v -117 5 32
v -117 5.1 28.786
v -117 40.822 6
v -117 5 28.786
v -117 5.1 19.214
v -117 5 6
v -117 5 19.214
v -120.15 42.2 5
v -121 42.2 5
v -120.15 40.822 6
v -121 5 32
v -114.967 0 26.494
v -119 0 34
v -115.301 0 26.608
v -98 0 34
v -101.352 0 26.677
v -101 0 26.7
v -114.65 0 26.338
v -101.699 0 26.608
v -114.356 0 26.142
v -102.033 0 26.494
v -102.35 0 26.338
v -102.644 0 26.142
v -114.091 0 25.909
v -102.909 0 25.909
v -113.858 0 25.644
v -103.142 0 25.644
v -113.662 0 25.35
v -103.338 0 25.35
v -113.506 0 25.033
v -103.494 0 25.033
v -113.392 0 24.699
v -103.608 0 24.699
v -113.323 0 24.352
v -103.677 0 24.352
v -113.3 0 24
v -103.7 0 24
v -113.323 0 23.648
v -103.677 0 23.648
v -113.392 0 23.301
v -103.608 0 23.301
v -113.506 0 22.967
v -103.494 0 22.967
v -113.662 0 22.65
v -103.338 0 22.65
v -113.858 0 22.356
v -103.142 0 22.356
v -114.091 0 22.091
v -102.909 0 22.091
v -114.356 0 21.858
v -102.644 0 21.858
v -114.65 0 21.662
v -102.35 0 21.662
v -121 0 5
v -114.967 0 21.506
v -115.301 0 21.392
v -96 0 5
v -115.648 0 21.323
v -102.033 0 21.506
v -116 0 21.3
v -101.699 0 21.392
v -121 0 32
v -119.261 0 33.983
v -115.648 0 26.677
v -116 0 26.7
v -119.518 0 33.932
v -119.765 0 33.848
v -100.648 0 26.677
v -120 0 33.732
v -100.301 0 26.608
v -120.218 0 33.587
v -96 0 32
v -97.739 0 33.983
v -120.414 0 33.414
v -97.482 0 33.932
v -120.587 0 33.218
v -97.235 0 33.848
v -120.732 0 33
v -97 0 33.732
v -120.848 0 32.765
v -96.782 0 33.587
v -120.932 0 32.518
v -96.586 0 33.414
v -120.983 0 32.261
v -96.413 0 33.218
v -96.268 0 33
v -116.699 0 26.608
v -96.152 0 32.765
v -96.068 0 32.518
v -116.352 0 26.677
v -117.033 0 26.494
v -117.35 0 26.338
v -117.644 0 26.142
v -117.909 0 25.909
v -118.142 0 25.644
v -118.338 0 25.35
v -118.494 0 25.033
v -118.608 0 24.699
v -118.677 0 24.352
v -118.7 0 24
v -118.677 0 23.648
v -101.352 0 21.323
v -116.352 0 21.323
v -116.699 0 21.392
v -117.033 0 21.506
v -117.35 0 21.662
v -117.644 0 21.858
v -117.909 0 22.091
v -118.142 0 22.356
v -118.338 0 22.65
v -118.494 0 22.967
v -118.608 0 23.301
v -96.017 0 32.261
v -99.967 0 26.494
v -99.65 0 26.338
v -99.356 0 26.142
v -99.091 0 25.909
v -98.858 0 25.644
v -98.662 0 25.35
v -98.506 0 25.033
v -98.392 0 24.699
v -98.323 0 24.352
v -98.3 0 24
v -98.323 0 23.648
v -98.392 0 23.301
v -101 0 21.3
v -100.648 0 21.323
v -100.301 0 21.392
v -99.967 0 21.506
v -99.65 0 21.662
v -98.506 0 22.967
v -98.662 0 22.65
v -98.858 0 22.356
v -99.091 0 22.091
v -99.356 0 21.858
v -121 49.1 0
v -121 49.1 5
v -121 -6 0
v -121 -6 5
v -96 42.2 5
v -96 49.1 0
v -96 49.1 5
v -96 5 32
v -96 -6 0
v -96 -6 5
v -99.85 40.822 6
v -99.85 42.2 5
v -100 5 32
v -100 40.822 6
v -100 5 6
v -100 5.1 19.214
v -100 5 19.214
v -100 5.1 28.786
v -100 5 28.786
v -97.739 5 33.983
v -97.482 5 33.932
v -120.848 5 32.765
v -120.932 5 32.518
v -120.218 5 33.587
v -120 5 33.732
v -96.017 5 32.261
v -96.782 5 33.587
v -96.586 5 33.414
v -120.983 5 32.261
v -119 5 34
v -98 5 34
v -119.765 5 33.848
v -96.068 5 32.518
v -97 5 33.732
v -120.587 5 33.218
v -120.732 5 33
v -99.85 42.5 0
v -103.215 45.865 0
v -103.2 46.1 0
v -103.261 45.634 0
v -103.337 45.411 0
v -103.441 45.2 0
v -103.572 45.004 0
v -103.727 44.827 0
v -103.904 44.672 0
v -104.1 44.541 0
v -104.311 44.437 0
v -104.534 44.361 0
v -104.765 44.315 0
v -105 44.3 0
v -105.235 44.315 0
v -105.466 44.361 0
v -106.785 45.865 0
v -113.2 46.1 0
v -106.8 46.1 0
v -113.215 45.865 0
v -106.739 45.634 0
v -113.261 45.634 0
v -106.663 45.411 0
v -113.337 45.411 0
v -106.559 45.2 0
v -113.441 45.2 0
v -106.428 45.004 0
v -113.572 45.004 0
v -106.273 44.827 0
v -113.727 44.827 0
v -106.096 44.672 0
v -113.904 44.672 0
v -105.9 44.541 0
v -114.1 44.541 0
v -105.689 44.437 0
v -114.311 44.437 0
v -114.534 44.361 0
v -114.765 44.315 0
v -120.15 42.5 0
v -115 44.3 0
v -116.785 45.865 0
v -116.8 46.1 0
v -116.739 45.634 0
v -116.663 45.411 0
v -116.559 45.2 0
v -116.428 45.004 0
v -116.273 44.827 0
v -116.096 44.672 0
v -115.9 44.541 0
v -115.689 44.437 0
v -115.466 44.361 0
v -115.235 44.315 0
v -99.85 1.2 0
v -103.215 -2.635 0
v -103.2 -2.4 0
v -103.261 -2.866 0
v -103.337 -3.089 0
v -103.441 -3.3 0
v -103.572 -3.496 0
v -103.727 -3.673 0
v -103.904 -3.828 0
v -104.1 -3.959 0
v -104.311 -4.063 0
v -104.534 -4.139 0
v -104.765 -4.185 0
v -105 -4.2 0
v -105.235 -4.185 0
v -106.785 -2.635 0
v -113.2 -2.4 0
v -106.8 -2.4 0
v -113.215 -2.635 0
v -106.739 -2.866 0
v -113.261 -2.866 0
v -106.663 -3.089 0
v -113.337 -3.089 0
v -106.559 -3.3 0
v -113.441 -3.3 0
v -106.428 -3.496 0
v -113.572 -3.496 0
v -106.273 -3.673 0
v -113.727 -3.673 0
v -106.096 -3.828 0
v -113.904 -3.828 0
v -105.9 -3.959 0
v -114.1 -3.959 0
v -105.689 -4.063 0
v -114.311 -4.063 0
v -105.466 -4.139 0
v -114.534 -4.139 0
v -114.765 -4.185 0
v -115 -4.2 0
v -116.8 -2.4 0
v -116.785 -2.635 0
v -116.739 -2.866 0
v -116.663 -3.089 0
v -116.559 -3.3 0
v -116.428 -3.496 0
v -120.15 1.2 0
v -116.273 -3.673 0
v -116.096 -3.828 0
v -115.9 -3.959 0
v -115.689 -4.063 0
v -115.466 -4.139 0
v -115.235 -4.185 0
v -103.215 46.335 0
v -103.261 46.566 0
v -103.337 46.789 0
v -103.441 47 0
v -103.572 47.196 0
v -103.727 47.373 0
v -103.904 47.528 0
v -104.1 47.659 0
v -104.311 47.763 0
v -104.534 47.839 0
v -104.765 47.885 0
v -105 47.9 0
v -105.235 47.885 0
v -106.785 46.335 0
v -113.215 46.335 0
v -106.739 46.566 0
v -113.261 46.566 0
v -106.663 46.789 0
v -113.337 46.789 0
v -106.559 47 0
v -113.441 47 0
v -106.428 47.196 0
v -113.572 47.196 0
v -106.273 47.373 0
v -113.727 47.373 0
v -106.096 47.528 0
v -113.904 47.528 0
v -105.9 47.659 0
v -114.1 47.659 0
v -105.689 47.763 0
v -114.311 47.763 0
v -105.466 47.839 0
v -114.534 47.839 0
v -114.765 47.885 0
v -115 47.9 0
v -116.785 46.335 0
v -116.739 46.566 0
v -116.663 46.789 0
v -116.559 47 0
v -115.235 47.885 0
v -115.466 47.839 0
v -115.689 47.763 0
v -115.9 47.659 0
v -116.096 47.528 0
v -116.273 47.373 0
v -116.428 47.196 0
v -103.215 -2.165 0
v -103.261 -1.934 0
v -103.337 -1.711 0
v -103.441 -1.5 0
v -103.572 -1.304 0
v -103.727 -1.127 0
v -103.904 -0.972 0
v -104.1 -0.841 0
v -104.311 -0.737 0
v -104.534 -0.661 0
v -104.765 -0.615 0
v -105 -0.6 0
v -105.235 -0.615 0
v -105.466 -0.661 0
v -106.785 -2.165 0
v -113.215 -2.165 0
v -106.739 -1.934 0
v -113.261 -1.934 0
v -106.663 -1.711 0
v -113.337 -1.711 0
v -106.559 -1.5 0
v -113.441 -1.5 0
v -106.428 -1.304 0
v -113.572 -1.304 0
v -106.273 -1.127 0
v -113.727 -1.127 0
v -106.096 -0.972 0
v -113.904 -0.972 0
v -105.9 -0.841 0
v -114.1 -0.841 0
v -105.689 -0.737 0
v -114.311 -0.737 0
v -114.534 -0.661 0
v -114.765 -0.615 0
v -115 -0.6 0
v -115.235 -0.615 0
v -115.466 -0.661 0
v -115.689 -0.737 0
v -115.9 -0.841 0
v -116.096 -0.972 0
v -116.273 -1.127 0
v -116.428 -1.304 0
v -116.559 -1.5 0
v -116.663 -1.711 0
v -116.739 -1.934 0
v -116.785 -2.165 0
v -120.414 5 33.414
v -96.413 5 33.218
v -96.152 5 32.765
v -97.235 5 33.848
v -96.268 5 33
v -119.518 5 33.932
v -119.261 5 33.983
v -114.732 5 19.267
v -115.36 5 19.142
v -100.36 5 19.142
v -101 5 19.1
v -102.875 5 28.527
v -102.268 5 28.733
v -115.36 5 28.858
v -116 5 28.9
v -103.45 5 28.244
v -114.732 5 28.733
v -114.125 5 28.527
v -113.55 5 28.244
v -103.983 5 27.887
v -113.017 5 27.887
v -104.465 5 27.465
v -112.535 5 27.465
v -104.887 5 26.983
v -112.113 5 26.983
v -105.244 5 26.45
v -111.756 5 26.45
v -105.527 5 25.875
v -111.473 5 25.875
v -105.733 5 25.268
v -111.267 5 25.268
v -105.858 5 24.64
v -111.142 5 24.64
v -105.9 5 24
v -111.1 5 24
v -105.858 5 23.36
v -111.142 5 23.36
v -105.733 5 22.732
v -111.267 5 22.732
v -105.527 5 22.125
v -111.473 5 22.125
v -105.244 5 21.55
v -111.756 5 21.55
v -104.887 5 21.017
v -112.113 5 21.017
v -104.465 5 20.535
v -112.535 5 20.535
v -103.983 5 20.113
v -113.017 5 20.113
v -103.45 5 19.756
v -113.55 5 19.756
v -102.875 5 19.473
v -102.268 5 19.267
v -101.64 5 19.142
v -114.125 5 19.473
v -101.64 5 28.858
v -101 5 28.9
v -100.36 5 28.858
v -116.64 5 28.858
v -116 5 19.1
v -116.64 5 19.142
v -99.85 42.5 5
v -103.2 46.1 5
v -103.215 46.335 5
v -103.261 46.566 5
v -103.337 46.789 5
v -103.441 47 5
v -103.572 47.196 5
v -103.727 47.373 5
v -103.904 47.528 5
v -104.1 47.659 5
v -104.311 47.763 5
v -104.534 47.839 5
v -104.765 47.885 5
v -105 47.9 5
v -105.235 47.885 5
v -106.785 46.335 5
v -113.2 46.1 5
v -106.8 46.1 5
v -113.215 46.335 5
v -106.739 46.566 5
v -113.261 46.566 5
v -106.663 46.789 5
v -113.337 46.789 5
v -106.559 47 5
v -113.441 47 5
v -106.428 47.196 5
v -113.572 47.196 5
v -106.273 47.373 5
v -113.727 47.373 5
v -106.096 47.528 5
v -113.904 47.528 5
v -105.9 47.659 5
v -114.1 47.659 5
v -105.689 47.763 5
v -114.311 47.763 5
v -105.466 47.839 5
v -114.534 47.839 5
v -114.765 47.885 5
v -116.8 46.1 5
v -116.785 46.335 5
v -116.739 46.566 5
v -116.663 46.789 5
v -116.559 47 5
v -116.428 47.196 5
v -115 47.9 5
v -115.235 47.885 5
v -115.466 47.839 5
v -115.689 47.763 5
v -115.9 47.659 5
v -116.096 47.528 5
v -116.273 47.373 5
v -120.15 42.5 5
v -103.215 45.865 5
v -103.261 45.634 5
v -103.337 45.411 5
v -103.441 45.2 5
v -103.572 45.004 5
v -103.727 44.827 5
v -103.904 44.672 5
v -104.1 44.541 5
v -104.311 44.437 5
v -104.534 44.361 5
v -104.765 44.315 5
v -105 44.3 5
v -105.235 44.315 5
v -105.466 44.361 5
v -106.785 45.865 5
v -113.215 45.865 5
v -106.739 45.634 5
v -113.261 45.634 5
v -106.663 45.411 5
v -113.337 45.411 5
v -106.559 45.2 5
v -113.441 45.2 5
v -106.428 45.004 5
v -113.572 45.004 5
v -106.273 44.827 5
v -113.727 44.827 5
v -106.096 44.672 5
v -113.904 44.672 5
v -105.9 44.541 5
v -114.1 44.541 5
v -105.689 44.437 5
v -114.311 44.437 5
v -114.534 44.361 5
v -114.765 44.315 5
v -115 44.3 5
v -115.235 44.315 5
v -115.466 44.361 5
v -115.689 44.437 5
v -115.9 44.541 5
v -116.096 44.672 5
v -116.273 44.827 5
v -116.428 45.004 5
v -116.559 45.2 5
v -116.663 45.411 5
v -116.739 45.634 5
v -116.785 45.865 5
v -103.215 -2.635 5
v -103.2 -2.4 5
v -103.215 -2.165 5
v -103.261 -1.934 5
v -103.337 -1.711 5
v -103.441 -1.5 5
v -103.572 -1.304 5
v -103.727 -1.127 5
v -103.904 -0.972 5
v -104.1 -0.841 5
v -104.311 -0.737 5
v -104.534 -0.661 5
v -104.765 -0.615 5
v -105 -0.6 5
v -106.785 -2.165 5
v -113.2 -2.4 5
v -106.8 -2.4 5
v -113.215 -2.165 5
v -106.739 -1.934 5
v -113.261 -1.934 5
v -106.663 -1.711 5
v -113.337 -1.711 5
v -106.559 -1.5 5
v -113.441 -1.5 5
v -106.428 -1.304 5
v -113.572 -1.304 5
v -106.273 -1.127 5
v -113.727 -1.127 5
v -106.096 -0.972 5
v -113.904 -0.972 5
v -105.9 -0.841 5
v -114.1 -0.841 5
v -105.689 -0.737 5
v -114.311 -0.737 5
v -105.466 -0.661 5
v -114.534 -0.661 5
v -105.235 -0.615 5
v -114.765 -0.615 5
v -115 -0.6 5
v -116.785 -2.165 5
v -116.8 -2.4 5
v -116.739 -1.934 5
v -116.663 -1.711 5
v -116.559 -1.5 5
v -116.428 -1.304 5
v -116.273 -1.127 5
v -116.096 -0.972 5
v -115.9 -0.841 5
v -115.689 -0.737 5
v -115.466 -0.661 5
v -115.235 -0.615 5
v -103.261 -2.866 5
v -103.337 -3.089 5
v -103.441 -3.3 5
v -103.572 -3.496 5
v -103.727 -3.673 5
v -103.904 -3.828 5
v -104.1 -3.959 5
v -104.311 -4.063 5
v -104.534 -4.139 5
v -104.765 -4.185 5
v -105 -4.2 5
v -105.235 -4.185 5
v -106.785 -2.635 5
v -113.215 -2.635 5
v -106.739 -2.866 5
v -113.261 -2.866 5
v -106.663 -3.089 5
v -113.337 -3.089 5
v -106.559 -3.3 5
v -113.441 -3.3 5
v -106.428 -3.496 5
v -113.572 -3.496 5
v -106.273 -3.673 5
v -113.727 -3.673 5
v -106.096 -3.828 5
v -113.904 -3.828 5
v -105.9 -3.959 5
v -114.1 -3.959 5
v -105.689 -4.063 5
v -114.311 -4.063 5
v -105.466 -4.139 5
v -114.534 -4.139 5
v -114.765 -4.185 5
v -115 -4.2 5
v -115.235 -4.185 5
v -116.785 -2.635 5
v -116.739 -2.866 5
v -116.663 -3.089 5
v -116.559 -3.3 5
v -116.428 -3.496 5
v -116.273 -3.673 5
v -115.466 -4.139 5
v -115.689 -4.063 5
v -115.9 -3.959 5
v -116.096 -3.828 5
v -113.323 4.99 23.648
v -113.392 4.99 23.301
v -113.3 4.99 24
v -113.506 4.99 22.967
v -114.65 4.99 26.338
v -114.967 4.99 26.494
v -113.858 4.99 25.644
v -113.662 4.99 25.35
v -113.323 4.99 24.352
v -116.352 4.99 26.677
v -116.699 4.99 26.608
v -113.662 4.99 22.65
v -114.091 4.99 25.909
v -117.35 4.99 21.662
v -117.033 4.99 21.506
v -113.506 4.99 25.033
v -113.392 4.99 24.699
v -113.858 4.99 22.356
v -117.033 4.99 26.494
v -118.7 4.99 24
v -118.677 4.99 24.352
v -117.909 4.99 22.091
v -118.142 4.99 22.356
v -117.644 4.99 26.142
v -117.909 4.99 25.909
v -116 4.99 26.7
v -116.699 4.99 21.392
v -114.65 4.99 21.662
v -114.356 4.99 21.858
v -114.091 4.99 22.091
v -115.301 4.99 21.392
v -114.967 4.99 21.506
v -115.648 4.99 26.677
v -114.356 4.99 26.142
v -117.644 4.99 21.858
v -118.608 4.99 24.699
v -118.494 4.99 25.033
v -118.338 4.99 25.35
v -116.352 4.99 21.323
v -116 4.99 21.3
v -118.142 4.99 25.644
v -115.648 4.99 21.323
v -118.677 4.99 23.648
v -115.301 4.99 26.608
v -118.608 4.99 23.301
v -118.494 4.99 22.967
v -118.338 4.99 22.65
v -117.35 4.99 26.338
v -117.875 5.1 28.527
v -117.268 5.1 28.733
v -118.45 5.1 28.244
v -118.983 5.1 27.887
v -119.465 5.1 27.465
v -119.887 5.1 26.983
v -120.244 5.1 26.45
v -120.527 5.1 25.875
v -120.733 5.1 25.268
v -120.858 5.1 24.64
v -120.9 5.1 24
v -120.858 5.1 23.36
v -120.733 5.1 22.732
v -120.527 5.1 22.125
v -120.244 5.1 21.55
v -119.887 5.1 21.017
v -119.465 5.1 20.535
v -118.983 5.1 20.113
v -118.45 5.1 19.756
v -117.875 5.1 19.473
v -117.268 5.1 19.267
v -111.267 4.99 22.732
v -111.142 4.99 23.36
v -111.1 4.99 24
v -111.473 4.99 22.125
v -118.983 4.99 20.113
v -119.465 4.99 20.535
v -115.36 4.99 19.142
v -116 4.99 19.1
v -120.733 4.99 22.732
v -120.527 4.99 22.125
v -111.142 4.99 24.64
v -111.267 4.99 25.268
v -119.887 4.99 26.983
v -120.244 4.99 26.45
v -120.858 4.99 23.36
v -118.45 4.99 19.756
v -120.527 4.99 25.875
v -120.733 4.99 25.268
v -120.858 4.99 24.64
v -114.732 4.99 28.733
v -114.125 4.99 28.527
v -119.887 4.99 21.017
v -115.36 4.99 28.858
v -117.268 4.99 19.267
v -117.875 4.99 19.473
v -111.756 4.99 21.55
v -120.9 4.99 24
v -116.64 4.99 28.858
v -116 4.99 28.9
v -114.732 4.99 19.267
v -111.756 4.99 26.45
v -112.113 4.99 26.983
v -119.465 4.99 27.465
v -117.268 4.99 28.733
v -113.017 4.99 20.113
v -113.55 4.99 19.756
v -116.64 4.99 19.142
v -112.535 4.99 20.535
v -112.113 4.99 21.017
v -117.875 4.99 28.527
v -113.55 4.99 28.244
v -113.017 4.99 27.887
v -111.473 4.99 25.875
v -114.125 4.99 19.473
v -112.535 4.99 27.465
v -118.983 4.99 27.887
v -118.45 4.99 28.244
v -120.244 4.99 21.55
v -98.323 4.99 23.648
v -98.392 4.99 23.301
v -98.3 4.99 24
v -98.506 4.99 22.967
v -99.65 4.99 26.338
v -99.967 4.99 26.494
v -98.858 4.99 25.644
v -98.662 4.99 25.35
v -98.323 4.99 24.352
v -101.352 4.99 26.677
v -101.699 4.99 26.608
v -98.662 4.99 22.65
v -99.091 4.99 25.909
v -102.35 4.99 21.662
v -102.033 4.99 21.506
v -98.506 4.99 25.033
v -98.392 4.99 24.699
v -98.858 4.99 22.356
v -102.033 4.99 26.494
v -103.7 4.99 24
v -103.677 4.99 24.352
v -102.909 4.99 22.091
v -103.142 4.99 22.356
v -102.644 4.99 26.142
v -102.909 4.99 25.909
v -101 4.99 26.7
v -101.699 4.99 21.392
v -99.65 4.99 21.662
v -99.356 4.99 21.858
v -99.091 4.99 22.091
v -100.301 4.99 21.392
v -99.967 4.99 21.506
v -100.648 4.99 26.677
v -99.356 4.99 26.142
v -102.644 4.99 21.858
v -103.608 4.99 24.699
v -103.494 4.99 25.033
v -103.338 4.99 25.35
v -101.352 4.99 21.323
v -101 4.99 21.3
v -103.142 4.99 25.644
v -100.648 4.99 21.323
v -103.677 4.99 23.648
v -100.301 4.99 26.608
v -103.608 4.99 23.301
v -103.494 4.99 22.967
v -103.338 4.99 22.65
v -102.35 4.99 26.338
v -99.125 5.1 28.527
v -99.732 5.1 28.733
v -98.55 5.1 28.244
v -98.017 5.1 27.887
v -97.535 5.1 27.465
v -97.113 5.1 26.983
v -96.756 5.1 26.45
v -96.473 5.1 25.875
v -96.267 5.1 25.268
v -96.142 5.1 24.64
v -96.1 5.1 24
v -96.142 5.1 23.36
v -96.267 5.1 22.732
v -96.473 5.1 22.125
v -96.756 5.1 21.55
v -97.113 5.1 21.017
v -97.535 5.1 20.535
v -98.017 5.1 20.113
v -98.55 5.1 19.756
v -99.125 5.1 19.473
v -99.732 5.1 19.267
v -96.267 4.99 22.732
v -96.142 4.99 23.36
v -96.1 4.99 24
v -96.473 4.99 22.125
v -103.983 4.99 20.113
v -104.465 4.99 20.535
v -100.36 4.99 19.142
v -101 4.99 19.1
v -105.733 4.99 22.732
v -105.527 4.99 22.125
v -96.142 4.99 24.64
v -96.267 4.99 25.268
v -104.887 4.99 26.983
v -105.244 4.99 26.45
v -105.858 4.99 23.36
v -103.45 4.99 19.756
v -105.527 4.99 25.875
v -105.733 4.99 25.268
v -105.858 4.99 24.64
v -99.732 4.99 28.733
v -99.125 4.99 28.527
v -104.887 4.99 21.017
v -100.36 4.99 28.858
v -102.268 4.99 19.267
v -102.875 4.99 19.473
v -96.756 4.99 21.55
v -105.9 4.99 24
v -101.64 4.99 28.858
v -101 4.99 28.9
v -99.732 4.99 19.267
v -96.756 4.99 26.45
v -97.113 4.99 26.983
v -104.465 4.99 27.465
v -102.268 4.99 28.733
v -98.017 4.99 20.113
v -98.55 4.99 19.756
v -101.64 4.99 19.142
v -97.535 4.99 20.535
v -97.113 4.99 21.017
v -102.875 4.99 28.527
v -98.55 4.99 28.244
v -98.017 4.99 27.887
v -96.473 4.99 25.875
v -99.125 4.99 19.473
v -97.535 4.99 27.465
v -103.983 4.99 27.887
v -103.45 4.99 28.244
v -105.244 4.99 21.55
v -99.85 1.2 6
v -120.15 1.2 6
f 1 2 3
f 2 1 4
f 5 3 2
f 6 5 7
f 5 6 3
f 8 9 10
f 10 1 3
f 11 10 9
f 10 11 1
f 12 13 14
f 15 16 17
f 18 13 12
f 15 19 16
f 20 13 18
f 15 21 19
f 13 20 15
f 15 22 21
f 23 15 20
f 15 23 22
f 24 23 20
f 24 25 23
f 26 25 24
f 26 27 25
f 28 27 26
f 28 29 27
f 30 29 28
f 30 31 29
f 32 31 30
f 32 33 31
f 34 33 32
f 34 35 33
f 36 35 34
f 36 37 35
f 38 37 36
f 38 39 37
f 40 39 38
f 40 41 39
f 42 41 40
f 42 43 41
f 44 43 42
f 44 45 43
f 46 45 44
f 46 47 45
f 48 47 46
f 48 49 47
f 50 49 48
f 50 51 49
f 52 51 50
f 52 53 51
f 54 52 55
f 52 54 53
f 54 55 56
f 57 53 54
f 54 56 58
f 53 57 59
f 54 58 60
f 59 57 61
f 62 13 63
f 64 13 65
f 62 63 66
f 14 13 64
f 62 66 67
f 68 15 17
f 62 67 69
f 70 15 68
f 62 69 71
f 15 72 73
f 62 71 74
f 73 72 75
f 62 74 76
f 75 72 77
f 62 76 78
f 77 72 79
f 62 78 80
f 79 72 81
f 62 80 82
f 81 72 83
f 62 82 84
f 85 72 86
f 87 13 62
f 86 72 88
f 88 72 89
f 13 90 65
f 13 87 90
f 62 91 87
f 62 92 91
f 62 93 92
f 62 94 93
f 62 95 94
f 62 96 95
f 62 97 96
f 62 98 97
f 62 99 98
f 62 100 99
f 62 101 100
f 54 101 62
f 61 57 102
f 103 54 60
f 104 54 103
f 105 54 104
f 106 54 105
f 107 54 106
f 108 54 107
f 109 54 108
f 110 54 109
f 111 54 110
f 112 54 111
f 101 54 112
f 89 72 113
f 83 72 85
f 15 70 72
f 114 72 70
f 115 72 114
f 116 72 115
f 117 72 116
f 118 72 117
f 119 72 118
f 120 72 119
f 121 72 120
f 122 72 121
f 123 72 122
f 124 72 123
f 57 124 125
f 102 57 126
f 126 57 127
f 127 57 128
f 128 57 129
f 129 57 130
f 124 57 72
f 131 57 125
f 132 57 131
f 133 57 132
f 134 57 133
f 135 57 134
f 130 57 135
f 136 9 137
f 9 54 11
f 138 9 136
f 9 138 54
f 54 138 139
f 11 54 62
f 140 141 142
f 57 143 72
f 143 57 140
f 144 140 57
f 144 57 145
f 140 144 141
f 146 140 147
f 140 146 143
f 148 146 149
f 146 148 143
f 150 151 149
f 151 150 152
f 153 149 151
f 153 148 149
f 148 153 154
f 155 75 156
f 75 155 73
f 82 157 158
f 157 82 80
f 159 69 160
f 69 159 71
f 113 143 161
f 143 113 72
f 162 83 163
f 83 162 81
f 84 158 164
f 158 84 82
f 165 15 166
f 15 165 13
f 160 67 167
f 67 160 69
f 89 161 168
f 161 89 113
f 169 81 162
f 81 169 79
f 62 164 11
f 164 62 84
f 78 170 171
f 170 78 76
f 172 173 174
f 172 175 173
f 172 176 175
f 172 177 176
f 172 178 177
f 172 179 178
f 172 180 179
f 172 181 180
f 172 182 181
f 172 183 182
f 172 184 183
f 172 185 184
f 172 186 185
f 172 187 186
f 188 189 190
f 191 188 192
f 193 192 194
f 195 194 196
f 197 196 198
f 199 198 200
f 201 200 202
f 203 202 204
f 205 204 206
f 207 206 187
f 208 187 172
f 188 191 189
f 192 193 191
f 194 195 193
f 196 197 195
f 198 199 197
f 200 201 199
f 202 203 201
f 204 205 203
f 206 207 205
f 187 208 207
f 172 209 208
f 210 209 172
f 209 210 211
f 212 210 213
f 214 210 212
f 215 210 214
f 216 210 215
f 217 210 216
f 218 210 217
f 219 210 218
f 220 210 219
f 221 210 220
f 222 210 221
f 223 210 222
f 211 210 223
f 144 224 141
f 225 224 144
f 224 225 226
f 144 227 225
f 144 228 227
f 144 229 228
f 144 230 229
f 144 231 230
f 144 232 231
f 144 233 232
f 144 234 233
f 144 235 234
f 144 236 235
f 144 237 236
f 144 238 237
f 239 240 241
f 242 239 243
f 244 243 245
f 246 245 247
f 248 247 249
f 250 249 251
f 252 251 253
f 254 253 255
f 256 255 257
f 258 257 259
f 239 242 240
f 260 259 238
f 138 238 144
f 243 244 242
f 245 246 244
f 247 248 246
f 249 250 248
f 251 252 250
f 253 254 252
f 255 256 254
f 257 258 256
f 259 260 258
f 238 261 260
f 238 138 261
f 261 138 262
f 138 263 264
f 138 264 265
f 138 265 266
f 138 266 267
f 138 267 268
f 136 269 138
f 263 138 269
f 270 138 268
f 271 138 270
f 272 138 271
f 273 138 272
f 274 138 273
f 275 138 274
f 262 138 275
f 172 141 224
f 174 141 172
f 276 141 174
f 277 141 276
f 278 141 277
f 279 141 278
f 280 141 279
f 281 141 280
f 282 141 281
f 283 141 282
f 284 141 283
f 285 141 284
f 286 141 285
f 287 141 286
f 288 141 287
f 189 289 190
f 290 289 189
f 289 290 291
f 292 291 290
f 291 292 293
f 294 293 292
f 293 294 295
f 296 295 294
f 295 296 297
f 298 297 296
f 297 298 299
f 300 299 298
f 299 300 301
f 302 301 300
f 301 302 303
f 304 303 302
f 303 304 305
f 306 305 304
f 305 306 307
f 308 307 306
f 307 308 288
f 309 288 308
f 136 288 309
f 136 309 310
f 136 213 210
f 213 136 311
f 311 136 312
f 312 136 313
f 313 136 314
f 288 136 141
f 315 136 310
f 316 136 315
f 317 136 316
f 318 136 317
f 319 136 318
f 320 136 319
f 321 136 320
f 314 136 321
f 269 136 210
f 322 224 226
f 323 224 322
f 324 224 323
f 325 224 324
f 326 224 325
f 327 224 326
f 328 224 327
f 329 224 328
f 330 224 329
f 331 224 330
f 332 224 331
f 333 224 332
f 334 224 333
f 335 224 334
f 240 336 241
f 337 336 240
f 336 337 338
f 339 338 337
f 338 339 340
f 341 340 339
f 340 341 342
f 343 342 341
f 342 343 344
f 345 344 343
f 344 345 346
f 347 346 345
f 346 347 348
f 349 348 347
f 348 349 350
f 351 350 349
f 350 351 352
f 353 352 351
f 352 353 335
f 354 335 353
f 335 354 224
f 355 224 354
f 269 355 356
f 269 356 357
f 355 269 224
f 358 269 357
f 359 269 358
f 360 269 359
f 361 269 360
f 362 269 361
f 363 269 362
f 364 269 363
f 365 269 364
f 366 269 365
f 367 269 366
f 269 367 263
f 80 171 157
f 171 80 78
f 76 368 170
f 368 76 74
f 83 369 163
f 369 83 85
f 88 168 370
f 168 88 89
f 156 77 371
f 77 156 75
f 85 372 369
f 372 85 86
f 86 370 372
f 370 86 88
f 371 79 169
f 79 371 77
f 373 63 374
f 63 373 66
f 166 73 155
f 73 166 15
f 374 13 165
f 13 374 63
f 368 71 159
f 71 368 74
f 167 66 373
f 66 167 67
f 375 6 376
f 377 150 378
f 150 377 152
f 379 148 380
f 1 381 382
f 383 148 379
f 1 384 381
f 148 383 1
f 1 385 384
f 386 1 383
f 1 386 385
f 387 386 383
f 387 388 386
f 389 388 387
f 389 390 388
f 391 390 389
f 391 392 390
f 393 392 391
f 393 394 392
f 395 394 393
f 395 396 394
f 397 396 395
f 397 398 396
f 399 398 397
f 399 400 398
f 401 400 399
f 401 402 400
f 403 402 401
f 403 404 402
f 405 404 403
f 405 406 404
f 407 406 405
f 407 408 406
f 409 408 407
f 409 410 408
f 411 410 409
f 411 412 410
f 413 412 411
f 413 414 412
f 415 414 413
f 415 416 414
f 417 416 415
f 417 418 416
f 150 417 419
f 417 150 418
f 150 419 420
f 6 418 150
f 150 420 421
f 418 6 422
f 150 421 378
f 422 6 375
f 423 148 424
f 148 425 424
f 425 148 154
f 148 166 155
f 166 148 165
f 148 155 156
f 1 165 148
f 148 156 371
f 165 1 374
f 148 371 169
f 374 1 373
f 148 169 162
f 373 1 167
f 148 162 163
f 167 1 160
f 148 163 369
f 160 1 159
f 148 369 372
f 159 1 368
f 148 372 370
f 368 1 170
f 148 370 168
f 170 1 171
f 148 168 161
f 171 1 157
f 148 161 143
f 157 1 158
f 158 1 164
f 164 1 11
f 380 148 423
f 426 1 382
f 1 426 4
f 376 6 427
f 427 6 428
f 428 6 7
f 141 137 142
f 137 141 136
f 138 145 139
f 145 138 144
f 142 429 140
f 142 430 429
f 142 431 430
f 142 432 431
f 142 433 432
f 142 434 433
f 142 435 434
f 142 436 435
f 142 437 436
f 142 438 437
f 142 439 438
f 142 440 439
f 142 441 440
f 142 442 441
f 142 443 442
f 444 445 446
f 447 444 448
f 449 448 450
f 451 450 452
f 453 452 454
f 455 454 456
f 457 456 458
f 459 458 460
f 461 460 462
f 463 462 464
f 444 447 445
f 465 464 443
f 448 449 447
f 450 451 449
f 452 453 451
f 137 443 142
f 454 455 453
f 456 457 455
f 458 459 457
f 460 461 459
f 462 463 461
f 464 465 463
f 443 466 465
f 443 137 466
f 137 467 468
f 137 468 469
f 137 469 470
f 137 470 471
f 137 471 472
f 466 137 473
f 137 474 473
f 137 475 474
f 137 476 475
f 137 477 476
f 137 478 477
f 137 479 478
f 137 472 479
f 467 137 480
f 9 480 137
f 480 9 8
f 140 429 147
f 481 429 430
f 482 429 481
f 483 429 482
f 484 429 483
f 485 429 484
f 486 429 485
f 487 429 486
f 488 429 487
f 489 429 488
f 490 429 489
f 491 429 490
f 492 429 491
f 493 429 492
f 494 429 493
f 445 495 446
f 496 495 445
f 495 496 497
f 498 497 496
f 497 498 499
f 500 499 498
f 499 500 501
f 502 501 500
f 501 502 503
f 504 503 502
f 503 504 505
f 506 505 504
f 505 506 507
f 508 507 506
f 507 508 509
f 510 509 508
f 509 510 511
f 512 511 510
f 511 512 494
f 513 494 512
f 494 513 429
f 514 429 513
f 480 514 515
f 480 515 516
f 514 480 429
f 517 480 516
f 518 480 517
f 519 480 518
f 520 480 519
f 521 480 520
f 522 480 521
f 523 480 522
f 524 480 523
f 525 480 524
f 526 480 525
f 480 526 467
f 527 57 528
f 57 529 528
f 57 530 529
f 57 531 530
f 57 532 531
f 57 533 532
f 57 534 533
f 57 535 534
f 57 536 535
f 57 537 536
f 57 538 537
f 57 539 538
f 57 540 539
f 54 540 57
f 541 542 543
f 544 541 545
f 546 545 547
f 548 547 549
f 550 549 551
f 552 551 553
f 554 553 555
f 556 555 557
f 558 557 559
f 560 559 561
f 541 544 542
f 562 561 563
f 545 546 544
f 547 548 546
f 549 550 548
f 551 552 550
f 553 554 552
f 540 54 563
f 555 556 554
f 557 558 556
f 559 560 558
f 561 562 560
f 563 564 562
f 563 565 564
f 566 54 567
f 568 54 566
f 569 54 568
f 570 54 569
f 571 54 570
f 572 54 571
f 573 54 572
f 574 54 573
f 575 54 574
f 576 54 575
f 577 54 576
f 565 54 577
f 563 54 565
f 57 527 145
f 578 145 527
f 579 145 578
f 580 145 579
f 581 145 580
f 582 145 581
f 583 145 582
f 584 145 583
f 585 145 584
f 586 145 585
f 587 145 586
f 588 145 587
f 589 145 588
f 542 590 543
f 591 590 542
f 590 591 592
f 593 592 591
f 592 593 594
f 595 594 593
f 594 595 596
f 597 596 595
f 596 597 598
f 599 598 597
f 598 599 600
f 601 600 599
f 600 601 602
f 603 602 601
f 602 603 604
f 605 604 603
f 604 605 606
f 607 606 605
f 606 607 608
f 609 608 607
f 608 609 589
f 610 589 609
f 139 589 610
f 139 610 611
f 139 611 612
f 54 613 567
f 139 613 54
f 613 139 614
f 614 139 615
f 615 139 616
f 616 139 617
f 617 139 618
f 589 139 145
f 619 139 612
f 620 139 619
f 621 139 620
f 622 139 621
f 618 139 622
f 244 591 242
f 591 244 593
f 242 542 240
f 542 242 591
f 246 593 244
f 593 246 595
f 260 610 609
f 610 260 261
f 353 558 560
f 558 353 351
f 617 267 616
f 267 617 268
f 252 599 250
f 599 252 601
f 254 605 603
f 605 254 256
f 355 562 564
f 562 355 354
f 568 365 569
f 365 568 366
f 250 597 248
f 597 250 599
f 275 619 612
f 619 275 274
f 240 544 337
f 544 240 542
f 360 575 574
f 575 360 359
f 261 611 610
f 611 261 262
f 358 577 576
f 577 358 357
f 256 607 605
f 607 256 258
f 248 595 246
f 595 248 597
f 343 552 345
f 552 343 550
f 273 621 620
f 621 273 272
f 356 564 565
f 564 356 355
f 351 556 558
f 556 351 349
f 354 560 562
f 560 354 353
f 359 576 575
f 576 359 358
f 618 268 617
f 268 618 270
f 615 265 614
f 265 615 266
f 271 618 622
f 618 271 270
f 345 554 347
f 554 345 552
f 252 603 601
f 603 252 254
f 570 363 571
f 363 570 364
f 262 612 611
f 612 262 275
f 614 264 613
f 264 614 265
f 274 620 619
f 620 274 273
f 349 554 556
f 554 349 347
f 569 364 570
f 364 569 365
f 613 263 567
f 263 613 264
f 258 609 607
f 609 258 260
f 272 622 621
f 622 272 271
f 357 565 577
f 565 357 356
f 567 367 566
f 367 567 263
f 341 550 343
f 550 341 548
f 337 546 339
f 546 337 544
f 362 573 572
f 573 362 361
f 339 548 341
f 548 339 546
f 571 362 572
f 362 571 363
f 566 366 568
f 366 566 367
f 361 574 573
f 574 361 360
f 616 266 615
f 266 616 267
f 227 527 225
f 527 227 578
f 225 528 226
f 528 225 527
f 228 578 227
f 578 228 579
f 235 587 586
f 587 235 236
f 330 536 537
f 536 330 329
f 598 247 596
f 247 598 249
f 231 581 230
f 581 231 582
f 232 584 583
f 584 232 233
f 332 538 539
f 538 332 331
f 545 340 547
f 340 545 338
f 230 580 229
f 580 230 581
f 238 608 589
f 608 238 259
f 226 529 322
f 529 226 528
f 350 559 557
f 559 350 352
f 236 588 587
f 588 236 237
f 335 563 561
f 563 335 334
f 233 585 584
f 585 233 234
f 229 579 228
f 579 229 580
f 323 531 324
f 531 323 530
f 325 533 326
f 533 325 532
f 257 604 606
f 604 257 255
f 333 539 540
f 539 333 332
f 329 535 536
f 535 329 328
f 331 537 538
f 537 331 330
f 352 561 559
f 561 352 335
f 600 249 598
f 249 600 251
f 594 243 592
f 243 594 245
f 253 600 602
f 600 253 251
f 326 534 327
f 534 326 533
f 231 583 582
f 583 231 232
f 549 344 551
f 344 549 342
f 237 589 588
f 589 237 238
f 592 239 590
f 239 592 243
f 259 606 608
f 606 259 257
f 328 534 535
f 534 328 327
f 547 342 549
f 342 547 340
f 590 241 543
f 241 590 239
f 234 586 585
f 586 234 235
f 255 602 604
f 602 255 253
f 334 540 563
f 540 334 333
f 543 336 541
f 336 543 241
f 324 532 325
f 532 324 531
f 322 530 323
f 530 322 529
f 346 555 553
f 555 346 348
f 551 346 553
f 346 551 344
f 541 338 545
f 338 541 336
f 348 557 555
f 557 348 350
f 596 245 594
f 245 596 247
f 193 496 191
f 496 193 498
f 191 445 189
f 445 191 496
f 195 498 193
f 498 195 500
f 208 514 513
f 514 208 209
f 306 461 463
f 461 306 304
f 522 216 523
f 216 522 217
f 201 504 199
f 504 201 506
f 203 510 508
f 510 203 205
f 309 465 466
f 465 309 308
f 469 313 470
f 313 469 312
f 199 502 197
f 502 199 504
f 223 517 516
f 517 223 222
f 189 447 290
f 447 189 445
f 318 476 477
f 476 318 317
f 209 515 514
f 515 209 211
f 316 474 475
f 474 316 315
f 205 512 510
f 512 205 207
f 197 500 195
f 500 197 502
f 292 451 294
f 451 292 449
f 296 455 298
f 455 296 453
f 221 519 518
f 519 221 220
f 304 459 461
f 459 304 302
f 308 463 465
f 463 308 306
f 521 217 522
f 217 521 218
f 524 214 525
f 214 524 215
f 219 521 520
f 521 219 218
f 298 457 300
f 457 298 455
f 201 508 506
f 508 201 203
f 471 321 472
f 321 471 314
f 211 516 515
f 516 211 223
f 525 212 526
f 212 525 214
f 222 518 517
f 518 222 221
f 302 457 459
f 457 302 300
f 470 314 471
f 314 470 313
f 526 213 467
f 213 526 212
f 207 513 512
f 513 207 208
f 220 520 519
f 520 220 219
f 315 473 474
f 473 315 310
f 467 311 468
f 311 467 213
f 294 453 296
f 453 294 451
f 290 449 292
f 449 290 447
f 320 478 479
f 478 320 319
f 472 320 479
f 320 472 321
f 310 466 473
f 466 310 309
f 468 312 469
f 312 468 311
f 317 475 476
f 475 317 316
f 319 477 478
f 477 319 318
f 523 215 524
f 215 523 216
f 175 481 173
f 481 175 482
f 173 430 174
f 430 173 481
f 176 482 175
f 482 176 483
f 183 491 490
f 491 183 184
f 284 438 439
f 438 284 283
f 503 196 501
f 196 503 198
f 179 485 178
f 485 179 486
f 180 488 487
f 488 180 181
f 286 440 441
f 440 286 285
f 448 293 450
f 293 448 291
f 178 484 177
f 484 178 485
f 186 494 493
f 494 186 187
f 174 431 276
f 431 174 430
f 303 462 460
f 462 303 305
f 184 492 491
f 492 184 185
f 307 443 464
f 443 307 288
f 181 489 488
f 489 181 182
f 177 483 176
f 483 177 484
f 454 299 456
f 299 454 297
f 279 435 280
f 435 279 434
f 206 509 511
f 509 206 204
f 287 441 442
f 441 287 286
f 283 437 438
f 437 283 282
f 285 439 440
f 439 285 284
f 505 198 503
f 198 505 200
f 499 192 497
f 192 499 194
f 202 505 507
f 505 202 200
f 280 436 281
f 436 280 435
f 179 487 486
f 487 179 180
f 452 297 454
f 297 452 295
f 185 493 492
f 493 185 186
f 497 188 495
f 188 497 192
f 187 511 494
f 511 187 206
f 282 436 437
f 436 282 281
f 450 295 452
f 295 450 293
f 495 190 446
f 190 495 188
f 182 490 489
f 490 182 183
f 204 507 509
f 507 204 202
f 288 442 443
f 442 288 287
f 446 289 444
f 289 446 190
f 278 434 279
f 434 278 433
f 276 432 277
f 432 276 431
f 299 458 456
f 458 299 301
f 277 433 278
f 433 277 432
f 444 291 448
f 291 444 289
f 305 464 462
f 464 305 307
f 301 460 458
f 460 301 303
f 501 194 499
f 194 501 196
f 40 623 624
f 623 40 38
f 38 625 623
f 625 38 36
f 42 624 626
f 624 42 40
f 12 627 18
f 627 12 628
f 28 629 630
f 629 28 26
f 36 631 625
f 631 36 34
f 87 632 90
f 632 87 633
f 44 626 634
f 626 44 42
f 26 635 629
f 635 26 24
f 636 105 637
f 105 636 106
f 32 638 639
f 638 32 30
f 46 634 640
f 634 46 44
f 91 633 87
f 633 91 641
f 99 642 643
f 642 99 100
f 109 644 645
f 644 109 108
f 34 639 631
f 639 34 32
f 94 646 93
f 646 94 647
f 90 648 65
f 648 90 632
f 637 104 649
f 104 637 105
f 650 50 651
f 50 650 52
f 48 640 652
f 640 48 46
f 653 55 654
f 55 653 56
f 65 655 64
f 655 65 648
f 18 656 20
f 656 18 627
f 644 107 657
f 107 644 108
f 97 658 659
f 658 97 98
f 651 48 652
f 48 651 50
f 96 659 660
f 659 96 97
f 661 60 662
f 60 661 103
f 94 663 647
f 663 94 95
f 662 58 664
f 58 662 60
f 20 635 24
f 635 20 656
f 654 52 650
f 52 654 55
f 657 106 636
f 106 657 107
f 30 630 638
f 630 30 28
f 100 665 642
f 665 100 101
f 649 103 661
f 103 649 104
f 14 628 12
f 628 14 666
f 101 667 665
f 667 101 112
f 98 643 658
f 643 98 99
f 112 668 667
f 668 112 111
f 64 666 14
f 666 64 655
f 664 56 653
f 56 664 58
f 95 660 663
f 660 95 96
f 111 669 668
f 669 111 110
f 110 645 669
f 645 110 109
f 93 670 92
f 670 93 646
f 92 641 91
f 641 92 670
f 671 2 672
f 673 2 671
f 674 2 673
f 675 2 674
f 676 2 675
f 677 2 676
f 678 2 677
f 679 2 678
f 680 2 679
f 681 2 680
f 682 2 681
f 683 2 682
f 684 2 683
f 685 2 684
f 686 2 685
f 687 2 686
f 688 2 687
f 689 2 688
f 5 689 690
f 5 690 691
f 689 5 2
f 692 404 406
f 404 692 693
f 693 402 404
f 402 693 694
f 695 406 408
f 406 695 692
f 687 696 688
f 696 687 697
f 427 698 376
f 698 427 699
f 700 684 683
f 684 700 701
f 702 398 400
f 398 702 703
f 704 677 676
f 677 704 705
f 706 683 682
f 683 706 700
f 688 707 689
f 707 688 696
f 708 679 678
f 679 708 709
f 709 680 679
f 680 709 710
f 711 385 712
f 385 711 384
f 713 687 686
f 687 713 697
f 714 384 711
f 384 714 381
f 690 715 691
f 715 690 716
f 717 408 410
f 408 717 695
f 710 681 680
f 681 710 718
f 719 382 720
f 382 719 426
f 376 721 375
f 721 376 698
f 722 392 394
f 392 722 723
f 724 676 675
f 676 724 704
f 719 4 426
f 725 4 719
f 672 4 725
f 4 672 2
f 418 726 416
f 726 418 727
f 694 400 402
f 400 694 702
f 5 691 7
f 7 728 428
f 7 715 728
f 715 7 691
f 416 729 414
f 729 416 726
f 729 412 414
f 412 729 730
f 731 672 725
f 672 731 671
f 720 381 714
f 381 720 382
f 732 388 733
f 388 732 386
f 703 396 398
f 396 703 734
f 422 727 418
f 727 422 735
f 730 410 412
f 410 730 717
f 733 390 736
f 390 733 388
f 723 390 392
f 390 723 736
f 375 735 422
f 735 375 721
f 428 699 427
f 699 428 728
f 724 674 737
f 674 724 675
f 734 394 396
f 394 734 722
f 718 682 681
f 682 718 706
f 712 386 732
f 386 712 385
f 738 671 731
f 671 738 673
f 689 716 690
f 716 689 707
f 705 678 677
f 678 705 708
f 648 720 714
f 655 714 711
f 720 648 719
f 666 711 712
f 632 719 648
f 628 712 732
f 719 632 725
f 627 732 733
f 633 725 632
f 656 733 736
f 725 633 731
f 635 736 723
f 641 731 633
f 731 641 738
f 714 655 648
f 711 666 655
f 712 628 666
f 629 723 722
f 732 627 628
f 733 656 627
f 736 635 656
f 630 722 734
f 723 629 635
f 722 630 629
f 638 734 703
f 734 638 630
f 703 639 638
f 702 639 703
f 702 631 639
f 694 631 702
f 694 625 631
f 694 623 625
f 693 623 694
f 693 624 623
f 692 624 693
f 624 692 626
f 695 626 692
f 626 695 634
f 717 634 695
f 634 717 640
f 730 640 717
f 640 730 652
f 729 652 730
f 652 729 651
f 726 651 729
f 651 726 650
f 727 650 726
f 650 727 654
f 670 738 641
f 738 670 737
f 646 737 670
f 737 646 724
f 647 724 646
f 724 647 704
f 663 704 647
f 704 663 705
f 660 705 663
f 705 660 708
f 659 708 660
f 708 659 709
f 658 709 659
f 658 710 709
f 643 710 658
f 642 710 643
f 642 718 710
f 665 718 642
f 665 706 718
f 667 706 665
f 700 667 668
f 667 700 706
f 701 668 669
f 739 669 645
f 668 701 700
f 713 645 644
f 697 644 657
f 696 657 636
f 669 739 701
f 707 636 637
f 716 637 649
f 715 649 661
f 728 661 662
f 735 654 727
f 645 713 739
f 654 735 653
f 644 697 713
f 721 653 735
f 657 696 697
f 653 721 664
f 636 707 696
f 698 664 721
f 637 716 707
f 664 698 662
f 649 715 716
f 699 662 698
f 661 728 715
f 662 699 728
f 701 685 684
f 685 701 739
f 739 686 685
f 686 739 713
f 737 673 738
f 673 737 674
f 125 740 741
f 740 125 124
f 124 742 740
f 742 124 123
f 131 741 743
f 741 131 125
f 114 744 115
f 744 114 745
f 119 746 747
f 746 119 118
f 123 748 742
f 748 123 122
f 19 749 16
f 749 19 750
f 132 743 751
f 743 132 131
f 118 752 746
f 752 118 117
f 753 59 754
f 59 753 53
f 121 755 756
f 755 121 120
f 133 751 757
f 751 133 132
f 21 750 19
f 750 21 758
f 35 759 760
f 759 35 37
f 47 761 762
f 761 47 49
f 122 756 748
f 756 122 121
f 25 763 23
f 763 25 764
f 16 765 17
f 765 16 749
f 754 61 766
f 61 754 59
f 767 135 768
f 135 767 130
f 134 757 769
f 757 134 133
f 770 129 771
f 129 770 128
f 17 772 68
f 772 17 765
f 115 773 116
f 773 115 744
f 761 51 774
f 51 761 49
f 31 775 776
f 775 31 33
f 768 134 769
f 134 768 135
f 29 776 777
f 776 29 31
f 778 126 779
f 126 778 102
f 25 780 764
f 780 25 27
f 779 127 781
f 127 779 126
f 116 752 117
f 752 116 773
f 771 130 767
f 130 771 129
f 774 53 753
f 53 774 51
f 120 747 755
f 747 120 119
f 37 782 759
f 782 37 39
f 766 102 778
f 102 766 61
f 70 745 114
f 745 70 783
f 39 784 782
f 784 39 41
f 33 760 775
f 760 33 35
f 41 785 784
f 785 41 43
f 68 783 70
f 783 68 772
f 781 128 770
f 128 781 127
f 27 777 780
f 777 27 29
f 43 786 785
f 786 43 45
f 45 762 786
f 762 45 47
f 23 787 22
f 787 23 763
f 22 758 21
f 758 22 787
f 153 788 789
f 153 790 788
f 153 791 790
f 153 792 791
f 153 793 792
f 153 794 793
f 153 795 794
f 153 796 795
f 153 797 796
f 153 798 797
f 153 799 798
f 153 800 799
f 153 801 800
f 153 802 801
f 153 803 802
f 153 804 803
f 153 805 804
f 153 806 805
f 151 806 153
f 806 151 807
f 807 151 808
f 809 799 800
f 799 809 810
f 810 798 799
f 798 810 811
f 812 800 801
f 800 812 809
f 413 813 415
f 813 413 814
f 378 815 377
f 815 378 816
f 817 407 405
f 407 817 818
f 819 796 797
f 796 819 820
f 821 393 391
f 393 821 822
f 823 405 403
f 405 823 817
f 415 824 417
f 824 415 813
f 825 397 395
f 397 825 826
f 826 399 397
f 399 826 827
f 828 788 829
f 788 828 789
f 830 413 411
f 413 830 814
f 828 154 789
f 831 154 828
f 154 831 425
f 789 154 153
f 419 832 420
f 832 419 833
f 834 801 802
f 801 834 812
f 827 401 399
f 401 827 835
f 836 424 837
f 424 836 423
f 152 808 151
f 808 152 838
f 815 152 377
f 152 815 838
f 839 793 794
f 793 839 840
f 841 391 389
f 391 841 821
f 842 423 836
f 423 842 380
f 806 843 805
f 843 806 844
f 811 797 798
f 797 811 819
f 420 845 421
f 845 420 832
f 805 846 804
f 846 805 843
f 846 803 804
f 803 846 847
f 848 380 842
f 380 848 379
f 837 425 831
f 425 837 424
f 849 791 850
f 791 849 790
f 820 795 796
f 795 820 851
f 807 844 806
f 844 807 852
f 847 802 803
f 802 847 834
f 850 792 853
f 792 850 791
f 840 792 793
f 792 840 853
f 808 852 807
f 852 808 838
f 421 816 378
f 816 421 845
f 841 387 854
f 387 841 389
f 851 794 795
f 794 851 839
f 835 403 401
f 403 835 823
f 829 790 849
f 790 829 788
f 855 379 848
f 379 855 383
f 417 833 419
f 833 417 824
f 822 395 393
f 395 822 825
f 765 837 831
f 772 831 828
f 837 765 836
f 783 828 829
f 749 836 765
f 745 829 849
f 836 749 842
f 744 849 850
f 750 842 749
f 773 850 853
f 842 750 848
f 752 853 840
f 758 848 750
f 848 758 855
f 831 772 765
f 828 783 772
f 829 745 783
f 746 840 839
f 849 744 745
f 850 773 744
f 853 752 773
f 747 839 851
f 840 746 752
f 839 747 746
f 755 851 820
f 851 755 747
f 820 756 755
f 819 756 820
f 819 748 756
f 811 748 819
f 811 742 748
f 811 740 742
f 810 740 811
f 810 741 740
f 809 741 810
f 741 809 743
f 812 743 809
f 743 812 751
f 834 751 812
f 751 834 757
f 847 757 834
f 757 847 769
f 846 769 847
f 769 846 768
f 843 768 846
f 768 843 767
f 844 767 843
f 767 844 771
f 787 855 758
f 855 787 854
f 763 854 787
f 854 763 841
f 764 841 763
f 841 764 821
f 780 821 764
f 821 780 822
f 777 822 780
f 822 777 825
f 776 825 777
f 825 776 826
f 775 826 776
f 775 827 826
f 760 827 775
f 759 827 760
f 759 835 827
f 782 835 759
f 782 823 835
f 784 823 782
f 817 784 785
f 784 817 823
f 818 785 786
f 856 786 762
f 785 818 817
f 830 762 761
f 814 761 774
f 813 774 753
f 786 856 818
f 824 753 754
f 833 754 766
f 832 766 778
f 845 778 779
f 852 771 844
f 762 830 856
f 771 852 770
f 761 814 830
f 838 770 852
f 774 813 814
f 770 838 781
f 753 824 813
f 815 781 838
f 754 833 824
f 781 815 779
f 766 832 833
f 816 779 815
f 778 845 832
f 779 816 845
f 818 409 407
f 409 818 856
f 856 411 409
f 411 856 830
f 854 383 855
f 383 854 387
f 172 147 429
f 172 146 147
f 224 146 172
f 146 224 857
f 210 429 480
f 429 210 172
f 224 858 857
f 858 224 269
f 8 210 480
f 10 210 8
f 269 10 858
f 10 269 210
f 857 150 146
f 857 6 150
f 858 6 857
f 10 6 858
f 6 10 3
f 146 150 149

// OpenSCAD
// file: lib/comun.scad
// =====================================================================
// AutoSwapEnder3Pro - parametros y utilidades comunes de las piezas
// Licencia MIT. Unidades: milimetros.
//
// Sistema de coordenadas de la ESTACION (el mismo en todas las piezas que
// se montan en ella):
//   s : a lo largo de la estacion, 0 = HOME del carro, crece hacia la impresora
//   x : a lo ancho, 0 = eje central (riel lineal), +x = lado de la caja de descarga
//   z : vertical, 0 = cara superior de la base de perfiles 2020 ("b" en la guia)
// El plano de transferencia (superficie por la que se deslizan las placas)
// esta en z = PLANO. Se ajusta a la altura de la cama de la impresora con las
// patas niveladoras, NO cambiando estas piezas.
// =====================================================================

$fn = 48;

// ----------------------------------------------------- placas y cama
placa_ancho  = 235;     // placa PEI
placa_largo  = 235;
placa_esp    = 0.6;     // espesor real de tus placas (mide con calibrador; 0.5 a 0.75)
voladizo     = 11;      // cuanto sobresale la placa (o su lengüeta) por delante de la cama

// ----------------------------------------------------- estacion (alturas sobre la base)
PLANO        = 60;      // plano de transferencia sobre la cara superior de la base
RIEL_SUP     = 20;      // cara superior del riel lineal (2020 apoyado en los travesaños)
ZP           = PLANO - RIEL_SUP;  // = 40: plano de transferencia sobre el riel lineal

// zapata (debe coincidir con zapata.scad)
zapata_bajo  = 8;       // cuanto cuelga la zapata por debajo de la placa
zapata_bolsillo = 6;    // profundidad del bolsillo para el dedo (desde abajo)

// cargador (ascensor)
paso_estante = 14;      // distancia vertical entre placas en el cargador
niveles      = 6;       // placas que caben en el cargador

// ----------------------------------------------------- perfil y tornilleria
perfil      = 20;       // perfil de aluminio 2020
ranura_ancho = 6.2;     // boca de la ranura (serie 20)
holgura     = 0.3;      // holgura general de impresion

m2_paso     = 1.8;   // agujero para autorroscante M2 (servos)
m3          = 3.4;   // paso libre M3
m3_rosca    = 2.7;   // para roscar M3 directamente en plastico
m3_tuerca   = 5.7;   // M3: entre caras + holgura
m3_tuerca_h = 2.6;
m3_cabeza   = 6.2;
m4          = 4.4;
m5          = 5.4;   // paso libre M5
m5_cabeza   = 9.2;
m5_tuerca   = 8.2;   // M5: entre caras + holgura

// ruedas en V estandar (Openbuilds "Solid V Wheel" + rodamientos 625)
rueda_d      = 23.9;
rueda_ancho  = 10.2;
rueda_sep    = 39.26;   // distancia entre centros de ruedas a ambos lados de un 2020
excentrica_d = 7.2;     // alojamiento del espaciador excentrico
espaciador_h = 6;       // espaciador (excentrico o fijo) entre rueda y placa

// ----------------------------------------------------- utilidades

// Caja con aristas verticales redondeadas (r) apoyada en z=0.
module caja_r(size, r = 2) {
  r2 = min(r, size[0] / 2 - 0.01, size[1] / 2 - 0.01);
  hull() for (ix = [r2, size[0] - r2], iy = [r2, size[1] - r2])
    translate([ix, iy, 0]) cylinder(r = r2, h = size[2]);
}

// Igual pero centrada en x e y.
module caja_rc(size, r = 2) { translate([-size[0] / 2, -size[1] / 2, 0]) caja_r(size, r); }

// Prisma hexagonal para tuercas (ec = medida entre caras).
module hexagono(ec, h) { cylinder(d = ec / cos(30), h = h, $fn = 6); }

// Ranura (agujero alargado) a lo largo de x.
module ranura(largo, d, h) {
  hull() for (i = [-largo / 2, largo / 2]) translate([i, 0, 0]) cylinder(d = d, h = h);
}

// Taladro M5 con avellanado para la cabeza (para atornillar a un perfil con tuerca en T).
module taladro_m5(h, cabeza = 4) {
  translate([0, 0, -0.1]) cylinder(d = m5, h = h + 0.2);
  translate([0, 0, h - cabeza]) cylinder(d = m5_cabeza + 0.6, h = cabeza + 0.1);
}

// Taladro M3 pasante con alojamiento de tuerca hexagonal por debajo.
module taladro_m3_tuerca(h, prof_tuerca = m3_tuerca_h + 0.2) {
  translate([0, 0, -0.1]) cylinder(d = m3, h = h + 0.2);
  translate([0, 0, -0.1]) hexagono(m3_tuerca, prof_tuerca + 0.1);
}

// Perfil 2020 de referencia (solo para ensamble y comprobaciones visuales).
module perfil2020(largo) {
  difference() {
    translate([-10, -10, 0]) cube([20, 20, largo]);
    for (a = [0, 90, 180, 270]) rotate([0, 0, a])
      translate([10 - 1.8, -ranura_ancho / 2, -1]) cube([2, ranura_ancho, largo + 2]);
    translate([0, 0, -1]) cylinder(d = 4.2, h = largo + 2);
  }
}

// Microinterruptor KW11-3Z con palanca de rodillo (referencia: 20 x 6.4 x 10 mm,
// taladros M2 a 9.5 mm). Agujeros de montaje, con la cara de montaje en z=0.
module taladros_kw11(h = 10) {
  for (i = [-4.75, 4.75]) translate([i, 0, -0.1]) cylinder(d = 2.2, h = h + 0.2);
}
// main file
// =====================================================================
// SERVO DEL VOLTEADOR (MG996R) - soporte + palanca con rodillo
// Material: PETG. 5 perimetros, 50 %.
//   pieza = "soporte" : se atornilla al travesaño s = 400 (2 x M5 + tuercas en T).
//                       El servo va de pie (eje a lo largo de s), con el eje en
//                       x = -110, z = PLANO - 28, y la palanca gira en el plano s = 440.
//   pieza = "palanca" : brazo de 35 mm que se atornilla al disco del servo; en la
//                       punta lleva un rodillo (rodamiento 623ZZ + tornillo M3 x 10)
//                       que rueda por la pista inferior del volteador.
// Reposo: la palanca apunta hacia +x (horizontal). Al girar ~90-120 grados sube y
// levanta el volteador (calibrar flap_closed_deg / flap_open_deg en la estacion).
// =====================================================================
include <lib/comun.scad>

pieza = "soporte";

eje = [-110, PLANO - 28];   // (x, z) del eje del servo
s_palanca = 440;           // plano de giro de la palanca
// MG996R
sv_l = 40.7; sv_w = 19.7; sv_h = 37.0;   // largo, ancho, alto de la caja
sv_eje_ext = 10.2;   // eje a 10.2 mm del extremo
sv_oreja = 27.5;     // de la base del servo a la cara superior de las orejas
sv_oreja_e = 2.5;
sv_orejas = [48.5, 10];  // separacion de taladros (a lo largo, a lo ancho)
s_base = s_palanca - 4 - sv_h;   // cara inferior del servo (s)
s_oreja = s_base + sv_oreja - sv_oreja_e;  // las orejas apoyan en la cara +s de la placa
// servo con su largo en vertical: el eje queda a 10.2 mm del extremo superior
z_cuerpo = [eje[1] - (sv_l - sv_eje_ext), eje[1] + sv_eje_ext];
z_centro = (z_cuerpo[0] + z_cuerpo[1]) / 2;

module soporte() {
  placa_x = [-121, -96];
  difference() {
    union() {
      // base sobre el travesaño (s 390-410) que se prolonga hasta la placa de orejas
      translate([placa_x[0], 390, 0]) caja_r([placa_x[1] - placa_x[0], s_oreja - 390, 5], 2);
      // placa de orejas
      translate([placa_x[0], s_oreja - 5, -6]) cube([placa_x[1] - placa_x[0], 5, z_centro + sv_orejas[0] / 2 + 3 + 6]);
      // escuadras
      for (x = [placa_x[0], placa_x[1] - 4]) hull() {
        translate([x, 392, 0]) cube([4, 1, 5]);
        translate([x, s_oreja - 5, 0]) cube([4, 1, z_cuerpo[1]]);
      }
    }
    // ventana del cuerpo
    translate([eje[0] - sv_w / 2 - 0.3, s_oreja - 6, z_cuerpo[0] - 0.3]) cube([sv_w + 0.6, 7, sv_l + 0.6]);
    // taladros de las orejas (M4 o M3 con arandela)
    for (dz = [-sv_orejas[0] / 2, sv_orejas[0] / 2], dx = [-sv_orejas[1] / 2, sv_orejas[1] / 2])
      translate([eje[0] + dx, s_oreja - 6, z_centro + dz]) rotate([-90, 0, 0]) cylinder(d = 3.6, h = 7);
    // M5 al travesaño (centrado en s = 400)
    for (x = [-116, -101]) translate([x, 400, 0]) taladro_m5(5, 0.01);
  }
}

module palanca() {
  largo = 35;
  difference() {
    union() {
      cylinder(d = 26, h = 4);
      hull() {
        cylinder(d = 12, h = 6);
        translate([largo, 0, 0]) cylinder(d = 10, h = 6);
      }
    }
    // centro (tornillo del eje y estria)
    translate([0, 0, -1]) cylinder(d = 7.5, h = 10);
    // ranuras radiales para atornillar al disco del servo (M2 / autorroscantes)
    for (a = [0 : 45 : 359]) rotate([0, 0, a + 22.5]) translate([7, 0, -1]) hull() {
      cylinder(d = 2.2, h = 10);
      translate([4, 0, 0]) cylinder(d = 2.2, h = 10);
    }
    // eje del rodillo 623ZZ (M3) en la punta
    translate([largo, 0, -1]) cylinder(d = m3_rosca, h = 10);
  }
}

// Orientacion de impresion: la cara de las orejas (+s) apoyada en la cama
if (pieza == "soporte") translate([0, 0, s_oreja]) rotate([-90, 0, 0]) soporte();
else palanca();
